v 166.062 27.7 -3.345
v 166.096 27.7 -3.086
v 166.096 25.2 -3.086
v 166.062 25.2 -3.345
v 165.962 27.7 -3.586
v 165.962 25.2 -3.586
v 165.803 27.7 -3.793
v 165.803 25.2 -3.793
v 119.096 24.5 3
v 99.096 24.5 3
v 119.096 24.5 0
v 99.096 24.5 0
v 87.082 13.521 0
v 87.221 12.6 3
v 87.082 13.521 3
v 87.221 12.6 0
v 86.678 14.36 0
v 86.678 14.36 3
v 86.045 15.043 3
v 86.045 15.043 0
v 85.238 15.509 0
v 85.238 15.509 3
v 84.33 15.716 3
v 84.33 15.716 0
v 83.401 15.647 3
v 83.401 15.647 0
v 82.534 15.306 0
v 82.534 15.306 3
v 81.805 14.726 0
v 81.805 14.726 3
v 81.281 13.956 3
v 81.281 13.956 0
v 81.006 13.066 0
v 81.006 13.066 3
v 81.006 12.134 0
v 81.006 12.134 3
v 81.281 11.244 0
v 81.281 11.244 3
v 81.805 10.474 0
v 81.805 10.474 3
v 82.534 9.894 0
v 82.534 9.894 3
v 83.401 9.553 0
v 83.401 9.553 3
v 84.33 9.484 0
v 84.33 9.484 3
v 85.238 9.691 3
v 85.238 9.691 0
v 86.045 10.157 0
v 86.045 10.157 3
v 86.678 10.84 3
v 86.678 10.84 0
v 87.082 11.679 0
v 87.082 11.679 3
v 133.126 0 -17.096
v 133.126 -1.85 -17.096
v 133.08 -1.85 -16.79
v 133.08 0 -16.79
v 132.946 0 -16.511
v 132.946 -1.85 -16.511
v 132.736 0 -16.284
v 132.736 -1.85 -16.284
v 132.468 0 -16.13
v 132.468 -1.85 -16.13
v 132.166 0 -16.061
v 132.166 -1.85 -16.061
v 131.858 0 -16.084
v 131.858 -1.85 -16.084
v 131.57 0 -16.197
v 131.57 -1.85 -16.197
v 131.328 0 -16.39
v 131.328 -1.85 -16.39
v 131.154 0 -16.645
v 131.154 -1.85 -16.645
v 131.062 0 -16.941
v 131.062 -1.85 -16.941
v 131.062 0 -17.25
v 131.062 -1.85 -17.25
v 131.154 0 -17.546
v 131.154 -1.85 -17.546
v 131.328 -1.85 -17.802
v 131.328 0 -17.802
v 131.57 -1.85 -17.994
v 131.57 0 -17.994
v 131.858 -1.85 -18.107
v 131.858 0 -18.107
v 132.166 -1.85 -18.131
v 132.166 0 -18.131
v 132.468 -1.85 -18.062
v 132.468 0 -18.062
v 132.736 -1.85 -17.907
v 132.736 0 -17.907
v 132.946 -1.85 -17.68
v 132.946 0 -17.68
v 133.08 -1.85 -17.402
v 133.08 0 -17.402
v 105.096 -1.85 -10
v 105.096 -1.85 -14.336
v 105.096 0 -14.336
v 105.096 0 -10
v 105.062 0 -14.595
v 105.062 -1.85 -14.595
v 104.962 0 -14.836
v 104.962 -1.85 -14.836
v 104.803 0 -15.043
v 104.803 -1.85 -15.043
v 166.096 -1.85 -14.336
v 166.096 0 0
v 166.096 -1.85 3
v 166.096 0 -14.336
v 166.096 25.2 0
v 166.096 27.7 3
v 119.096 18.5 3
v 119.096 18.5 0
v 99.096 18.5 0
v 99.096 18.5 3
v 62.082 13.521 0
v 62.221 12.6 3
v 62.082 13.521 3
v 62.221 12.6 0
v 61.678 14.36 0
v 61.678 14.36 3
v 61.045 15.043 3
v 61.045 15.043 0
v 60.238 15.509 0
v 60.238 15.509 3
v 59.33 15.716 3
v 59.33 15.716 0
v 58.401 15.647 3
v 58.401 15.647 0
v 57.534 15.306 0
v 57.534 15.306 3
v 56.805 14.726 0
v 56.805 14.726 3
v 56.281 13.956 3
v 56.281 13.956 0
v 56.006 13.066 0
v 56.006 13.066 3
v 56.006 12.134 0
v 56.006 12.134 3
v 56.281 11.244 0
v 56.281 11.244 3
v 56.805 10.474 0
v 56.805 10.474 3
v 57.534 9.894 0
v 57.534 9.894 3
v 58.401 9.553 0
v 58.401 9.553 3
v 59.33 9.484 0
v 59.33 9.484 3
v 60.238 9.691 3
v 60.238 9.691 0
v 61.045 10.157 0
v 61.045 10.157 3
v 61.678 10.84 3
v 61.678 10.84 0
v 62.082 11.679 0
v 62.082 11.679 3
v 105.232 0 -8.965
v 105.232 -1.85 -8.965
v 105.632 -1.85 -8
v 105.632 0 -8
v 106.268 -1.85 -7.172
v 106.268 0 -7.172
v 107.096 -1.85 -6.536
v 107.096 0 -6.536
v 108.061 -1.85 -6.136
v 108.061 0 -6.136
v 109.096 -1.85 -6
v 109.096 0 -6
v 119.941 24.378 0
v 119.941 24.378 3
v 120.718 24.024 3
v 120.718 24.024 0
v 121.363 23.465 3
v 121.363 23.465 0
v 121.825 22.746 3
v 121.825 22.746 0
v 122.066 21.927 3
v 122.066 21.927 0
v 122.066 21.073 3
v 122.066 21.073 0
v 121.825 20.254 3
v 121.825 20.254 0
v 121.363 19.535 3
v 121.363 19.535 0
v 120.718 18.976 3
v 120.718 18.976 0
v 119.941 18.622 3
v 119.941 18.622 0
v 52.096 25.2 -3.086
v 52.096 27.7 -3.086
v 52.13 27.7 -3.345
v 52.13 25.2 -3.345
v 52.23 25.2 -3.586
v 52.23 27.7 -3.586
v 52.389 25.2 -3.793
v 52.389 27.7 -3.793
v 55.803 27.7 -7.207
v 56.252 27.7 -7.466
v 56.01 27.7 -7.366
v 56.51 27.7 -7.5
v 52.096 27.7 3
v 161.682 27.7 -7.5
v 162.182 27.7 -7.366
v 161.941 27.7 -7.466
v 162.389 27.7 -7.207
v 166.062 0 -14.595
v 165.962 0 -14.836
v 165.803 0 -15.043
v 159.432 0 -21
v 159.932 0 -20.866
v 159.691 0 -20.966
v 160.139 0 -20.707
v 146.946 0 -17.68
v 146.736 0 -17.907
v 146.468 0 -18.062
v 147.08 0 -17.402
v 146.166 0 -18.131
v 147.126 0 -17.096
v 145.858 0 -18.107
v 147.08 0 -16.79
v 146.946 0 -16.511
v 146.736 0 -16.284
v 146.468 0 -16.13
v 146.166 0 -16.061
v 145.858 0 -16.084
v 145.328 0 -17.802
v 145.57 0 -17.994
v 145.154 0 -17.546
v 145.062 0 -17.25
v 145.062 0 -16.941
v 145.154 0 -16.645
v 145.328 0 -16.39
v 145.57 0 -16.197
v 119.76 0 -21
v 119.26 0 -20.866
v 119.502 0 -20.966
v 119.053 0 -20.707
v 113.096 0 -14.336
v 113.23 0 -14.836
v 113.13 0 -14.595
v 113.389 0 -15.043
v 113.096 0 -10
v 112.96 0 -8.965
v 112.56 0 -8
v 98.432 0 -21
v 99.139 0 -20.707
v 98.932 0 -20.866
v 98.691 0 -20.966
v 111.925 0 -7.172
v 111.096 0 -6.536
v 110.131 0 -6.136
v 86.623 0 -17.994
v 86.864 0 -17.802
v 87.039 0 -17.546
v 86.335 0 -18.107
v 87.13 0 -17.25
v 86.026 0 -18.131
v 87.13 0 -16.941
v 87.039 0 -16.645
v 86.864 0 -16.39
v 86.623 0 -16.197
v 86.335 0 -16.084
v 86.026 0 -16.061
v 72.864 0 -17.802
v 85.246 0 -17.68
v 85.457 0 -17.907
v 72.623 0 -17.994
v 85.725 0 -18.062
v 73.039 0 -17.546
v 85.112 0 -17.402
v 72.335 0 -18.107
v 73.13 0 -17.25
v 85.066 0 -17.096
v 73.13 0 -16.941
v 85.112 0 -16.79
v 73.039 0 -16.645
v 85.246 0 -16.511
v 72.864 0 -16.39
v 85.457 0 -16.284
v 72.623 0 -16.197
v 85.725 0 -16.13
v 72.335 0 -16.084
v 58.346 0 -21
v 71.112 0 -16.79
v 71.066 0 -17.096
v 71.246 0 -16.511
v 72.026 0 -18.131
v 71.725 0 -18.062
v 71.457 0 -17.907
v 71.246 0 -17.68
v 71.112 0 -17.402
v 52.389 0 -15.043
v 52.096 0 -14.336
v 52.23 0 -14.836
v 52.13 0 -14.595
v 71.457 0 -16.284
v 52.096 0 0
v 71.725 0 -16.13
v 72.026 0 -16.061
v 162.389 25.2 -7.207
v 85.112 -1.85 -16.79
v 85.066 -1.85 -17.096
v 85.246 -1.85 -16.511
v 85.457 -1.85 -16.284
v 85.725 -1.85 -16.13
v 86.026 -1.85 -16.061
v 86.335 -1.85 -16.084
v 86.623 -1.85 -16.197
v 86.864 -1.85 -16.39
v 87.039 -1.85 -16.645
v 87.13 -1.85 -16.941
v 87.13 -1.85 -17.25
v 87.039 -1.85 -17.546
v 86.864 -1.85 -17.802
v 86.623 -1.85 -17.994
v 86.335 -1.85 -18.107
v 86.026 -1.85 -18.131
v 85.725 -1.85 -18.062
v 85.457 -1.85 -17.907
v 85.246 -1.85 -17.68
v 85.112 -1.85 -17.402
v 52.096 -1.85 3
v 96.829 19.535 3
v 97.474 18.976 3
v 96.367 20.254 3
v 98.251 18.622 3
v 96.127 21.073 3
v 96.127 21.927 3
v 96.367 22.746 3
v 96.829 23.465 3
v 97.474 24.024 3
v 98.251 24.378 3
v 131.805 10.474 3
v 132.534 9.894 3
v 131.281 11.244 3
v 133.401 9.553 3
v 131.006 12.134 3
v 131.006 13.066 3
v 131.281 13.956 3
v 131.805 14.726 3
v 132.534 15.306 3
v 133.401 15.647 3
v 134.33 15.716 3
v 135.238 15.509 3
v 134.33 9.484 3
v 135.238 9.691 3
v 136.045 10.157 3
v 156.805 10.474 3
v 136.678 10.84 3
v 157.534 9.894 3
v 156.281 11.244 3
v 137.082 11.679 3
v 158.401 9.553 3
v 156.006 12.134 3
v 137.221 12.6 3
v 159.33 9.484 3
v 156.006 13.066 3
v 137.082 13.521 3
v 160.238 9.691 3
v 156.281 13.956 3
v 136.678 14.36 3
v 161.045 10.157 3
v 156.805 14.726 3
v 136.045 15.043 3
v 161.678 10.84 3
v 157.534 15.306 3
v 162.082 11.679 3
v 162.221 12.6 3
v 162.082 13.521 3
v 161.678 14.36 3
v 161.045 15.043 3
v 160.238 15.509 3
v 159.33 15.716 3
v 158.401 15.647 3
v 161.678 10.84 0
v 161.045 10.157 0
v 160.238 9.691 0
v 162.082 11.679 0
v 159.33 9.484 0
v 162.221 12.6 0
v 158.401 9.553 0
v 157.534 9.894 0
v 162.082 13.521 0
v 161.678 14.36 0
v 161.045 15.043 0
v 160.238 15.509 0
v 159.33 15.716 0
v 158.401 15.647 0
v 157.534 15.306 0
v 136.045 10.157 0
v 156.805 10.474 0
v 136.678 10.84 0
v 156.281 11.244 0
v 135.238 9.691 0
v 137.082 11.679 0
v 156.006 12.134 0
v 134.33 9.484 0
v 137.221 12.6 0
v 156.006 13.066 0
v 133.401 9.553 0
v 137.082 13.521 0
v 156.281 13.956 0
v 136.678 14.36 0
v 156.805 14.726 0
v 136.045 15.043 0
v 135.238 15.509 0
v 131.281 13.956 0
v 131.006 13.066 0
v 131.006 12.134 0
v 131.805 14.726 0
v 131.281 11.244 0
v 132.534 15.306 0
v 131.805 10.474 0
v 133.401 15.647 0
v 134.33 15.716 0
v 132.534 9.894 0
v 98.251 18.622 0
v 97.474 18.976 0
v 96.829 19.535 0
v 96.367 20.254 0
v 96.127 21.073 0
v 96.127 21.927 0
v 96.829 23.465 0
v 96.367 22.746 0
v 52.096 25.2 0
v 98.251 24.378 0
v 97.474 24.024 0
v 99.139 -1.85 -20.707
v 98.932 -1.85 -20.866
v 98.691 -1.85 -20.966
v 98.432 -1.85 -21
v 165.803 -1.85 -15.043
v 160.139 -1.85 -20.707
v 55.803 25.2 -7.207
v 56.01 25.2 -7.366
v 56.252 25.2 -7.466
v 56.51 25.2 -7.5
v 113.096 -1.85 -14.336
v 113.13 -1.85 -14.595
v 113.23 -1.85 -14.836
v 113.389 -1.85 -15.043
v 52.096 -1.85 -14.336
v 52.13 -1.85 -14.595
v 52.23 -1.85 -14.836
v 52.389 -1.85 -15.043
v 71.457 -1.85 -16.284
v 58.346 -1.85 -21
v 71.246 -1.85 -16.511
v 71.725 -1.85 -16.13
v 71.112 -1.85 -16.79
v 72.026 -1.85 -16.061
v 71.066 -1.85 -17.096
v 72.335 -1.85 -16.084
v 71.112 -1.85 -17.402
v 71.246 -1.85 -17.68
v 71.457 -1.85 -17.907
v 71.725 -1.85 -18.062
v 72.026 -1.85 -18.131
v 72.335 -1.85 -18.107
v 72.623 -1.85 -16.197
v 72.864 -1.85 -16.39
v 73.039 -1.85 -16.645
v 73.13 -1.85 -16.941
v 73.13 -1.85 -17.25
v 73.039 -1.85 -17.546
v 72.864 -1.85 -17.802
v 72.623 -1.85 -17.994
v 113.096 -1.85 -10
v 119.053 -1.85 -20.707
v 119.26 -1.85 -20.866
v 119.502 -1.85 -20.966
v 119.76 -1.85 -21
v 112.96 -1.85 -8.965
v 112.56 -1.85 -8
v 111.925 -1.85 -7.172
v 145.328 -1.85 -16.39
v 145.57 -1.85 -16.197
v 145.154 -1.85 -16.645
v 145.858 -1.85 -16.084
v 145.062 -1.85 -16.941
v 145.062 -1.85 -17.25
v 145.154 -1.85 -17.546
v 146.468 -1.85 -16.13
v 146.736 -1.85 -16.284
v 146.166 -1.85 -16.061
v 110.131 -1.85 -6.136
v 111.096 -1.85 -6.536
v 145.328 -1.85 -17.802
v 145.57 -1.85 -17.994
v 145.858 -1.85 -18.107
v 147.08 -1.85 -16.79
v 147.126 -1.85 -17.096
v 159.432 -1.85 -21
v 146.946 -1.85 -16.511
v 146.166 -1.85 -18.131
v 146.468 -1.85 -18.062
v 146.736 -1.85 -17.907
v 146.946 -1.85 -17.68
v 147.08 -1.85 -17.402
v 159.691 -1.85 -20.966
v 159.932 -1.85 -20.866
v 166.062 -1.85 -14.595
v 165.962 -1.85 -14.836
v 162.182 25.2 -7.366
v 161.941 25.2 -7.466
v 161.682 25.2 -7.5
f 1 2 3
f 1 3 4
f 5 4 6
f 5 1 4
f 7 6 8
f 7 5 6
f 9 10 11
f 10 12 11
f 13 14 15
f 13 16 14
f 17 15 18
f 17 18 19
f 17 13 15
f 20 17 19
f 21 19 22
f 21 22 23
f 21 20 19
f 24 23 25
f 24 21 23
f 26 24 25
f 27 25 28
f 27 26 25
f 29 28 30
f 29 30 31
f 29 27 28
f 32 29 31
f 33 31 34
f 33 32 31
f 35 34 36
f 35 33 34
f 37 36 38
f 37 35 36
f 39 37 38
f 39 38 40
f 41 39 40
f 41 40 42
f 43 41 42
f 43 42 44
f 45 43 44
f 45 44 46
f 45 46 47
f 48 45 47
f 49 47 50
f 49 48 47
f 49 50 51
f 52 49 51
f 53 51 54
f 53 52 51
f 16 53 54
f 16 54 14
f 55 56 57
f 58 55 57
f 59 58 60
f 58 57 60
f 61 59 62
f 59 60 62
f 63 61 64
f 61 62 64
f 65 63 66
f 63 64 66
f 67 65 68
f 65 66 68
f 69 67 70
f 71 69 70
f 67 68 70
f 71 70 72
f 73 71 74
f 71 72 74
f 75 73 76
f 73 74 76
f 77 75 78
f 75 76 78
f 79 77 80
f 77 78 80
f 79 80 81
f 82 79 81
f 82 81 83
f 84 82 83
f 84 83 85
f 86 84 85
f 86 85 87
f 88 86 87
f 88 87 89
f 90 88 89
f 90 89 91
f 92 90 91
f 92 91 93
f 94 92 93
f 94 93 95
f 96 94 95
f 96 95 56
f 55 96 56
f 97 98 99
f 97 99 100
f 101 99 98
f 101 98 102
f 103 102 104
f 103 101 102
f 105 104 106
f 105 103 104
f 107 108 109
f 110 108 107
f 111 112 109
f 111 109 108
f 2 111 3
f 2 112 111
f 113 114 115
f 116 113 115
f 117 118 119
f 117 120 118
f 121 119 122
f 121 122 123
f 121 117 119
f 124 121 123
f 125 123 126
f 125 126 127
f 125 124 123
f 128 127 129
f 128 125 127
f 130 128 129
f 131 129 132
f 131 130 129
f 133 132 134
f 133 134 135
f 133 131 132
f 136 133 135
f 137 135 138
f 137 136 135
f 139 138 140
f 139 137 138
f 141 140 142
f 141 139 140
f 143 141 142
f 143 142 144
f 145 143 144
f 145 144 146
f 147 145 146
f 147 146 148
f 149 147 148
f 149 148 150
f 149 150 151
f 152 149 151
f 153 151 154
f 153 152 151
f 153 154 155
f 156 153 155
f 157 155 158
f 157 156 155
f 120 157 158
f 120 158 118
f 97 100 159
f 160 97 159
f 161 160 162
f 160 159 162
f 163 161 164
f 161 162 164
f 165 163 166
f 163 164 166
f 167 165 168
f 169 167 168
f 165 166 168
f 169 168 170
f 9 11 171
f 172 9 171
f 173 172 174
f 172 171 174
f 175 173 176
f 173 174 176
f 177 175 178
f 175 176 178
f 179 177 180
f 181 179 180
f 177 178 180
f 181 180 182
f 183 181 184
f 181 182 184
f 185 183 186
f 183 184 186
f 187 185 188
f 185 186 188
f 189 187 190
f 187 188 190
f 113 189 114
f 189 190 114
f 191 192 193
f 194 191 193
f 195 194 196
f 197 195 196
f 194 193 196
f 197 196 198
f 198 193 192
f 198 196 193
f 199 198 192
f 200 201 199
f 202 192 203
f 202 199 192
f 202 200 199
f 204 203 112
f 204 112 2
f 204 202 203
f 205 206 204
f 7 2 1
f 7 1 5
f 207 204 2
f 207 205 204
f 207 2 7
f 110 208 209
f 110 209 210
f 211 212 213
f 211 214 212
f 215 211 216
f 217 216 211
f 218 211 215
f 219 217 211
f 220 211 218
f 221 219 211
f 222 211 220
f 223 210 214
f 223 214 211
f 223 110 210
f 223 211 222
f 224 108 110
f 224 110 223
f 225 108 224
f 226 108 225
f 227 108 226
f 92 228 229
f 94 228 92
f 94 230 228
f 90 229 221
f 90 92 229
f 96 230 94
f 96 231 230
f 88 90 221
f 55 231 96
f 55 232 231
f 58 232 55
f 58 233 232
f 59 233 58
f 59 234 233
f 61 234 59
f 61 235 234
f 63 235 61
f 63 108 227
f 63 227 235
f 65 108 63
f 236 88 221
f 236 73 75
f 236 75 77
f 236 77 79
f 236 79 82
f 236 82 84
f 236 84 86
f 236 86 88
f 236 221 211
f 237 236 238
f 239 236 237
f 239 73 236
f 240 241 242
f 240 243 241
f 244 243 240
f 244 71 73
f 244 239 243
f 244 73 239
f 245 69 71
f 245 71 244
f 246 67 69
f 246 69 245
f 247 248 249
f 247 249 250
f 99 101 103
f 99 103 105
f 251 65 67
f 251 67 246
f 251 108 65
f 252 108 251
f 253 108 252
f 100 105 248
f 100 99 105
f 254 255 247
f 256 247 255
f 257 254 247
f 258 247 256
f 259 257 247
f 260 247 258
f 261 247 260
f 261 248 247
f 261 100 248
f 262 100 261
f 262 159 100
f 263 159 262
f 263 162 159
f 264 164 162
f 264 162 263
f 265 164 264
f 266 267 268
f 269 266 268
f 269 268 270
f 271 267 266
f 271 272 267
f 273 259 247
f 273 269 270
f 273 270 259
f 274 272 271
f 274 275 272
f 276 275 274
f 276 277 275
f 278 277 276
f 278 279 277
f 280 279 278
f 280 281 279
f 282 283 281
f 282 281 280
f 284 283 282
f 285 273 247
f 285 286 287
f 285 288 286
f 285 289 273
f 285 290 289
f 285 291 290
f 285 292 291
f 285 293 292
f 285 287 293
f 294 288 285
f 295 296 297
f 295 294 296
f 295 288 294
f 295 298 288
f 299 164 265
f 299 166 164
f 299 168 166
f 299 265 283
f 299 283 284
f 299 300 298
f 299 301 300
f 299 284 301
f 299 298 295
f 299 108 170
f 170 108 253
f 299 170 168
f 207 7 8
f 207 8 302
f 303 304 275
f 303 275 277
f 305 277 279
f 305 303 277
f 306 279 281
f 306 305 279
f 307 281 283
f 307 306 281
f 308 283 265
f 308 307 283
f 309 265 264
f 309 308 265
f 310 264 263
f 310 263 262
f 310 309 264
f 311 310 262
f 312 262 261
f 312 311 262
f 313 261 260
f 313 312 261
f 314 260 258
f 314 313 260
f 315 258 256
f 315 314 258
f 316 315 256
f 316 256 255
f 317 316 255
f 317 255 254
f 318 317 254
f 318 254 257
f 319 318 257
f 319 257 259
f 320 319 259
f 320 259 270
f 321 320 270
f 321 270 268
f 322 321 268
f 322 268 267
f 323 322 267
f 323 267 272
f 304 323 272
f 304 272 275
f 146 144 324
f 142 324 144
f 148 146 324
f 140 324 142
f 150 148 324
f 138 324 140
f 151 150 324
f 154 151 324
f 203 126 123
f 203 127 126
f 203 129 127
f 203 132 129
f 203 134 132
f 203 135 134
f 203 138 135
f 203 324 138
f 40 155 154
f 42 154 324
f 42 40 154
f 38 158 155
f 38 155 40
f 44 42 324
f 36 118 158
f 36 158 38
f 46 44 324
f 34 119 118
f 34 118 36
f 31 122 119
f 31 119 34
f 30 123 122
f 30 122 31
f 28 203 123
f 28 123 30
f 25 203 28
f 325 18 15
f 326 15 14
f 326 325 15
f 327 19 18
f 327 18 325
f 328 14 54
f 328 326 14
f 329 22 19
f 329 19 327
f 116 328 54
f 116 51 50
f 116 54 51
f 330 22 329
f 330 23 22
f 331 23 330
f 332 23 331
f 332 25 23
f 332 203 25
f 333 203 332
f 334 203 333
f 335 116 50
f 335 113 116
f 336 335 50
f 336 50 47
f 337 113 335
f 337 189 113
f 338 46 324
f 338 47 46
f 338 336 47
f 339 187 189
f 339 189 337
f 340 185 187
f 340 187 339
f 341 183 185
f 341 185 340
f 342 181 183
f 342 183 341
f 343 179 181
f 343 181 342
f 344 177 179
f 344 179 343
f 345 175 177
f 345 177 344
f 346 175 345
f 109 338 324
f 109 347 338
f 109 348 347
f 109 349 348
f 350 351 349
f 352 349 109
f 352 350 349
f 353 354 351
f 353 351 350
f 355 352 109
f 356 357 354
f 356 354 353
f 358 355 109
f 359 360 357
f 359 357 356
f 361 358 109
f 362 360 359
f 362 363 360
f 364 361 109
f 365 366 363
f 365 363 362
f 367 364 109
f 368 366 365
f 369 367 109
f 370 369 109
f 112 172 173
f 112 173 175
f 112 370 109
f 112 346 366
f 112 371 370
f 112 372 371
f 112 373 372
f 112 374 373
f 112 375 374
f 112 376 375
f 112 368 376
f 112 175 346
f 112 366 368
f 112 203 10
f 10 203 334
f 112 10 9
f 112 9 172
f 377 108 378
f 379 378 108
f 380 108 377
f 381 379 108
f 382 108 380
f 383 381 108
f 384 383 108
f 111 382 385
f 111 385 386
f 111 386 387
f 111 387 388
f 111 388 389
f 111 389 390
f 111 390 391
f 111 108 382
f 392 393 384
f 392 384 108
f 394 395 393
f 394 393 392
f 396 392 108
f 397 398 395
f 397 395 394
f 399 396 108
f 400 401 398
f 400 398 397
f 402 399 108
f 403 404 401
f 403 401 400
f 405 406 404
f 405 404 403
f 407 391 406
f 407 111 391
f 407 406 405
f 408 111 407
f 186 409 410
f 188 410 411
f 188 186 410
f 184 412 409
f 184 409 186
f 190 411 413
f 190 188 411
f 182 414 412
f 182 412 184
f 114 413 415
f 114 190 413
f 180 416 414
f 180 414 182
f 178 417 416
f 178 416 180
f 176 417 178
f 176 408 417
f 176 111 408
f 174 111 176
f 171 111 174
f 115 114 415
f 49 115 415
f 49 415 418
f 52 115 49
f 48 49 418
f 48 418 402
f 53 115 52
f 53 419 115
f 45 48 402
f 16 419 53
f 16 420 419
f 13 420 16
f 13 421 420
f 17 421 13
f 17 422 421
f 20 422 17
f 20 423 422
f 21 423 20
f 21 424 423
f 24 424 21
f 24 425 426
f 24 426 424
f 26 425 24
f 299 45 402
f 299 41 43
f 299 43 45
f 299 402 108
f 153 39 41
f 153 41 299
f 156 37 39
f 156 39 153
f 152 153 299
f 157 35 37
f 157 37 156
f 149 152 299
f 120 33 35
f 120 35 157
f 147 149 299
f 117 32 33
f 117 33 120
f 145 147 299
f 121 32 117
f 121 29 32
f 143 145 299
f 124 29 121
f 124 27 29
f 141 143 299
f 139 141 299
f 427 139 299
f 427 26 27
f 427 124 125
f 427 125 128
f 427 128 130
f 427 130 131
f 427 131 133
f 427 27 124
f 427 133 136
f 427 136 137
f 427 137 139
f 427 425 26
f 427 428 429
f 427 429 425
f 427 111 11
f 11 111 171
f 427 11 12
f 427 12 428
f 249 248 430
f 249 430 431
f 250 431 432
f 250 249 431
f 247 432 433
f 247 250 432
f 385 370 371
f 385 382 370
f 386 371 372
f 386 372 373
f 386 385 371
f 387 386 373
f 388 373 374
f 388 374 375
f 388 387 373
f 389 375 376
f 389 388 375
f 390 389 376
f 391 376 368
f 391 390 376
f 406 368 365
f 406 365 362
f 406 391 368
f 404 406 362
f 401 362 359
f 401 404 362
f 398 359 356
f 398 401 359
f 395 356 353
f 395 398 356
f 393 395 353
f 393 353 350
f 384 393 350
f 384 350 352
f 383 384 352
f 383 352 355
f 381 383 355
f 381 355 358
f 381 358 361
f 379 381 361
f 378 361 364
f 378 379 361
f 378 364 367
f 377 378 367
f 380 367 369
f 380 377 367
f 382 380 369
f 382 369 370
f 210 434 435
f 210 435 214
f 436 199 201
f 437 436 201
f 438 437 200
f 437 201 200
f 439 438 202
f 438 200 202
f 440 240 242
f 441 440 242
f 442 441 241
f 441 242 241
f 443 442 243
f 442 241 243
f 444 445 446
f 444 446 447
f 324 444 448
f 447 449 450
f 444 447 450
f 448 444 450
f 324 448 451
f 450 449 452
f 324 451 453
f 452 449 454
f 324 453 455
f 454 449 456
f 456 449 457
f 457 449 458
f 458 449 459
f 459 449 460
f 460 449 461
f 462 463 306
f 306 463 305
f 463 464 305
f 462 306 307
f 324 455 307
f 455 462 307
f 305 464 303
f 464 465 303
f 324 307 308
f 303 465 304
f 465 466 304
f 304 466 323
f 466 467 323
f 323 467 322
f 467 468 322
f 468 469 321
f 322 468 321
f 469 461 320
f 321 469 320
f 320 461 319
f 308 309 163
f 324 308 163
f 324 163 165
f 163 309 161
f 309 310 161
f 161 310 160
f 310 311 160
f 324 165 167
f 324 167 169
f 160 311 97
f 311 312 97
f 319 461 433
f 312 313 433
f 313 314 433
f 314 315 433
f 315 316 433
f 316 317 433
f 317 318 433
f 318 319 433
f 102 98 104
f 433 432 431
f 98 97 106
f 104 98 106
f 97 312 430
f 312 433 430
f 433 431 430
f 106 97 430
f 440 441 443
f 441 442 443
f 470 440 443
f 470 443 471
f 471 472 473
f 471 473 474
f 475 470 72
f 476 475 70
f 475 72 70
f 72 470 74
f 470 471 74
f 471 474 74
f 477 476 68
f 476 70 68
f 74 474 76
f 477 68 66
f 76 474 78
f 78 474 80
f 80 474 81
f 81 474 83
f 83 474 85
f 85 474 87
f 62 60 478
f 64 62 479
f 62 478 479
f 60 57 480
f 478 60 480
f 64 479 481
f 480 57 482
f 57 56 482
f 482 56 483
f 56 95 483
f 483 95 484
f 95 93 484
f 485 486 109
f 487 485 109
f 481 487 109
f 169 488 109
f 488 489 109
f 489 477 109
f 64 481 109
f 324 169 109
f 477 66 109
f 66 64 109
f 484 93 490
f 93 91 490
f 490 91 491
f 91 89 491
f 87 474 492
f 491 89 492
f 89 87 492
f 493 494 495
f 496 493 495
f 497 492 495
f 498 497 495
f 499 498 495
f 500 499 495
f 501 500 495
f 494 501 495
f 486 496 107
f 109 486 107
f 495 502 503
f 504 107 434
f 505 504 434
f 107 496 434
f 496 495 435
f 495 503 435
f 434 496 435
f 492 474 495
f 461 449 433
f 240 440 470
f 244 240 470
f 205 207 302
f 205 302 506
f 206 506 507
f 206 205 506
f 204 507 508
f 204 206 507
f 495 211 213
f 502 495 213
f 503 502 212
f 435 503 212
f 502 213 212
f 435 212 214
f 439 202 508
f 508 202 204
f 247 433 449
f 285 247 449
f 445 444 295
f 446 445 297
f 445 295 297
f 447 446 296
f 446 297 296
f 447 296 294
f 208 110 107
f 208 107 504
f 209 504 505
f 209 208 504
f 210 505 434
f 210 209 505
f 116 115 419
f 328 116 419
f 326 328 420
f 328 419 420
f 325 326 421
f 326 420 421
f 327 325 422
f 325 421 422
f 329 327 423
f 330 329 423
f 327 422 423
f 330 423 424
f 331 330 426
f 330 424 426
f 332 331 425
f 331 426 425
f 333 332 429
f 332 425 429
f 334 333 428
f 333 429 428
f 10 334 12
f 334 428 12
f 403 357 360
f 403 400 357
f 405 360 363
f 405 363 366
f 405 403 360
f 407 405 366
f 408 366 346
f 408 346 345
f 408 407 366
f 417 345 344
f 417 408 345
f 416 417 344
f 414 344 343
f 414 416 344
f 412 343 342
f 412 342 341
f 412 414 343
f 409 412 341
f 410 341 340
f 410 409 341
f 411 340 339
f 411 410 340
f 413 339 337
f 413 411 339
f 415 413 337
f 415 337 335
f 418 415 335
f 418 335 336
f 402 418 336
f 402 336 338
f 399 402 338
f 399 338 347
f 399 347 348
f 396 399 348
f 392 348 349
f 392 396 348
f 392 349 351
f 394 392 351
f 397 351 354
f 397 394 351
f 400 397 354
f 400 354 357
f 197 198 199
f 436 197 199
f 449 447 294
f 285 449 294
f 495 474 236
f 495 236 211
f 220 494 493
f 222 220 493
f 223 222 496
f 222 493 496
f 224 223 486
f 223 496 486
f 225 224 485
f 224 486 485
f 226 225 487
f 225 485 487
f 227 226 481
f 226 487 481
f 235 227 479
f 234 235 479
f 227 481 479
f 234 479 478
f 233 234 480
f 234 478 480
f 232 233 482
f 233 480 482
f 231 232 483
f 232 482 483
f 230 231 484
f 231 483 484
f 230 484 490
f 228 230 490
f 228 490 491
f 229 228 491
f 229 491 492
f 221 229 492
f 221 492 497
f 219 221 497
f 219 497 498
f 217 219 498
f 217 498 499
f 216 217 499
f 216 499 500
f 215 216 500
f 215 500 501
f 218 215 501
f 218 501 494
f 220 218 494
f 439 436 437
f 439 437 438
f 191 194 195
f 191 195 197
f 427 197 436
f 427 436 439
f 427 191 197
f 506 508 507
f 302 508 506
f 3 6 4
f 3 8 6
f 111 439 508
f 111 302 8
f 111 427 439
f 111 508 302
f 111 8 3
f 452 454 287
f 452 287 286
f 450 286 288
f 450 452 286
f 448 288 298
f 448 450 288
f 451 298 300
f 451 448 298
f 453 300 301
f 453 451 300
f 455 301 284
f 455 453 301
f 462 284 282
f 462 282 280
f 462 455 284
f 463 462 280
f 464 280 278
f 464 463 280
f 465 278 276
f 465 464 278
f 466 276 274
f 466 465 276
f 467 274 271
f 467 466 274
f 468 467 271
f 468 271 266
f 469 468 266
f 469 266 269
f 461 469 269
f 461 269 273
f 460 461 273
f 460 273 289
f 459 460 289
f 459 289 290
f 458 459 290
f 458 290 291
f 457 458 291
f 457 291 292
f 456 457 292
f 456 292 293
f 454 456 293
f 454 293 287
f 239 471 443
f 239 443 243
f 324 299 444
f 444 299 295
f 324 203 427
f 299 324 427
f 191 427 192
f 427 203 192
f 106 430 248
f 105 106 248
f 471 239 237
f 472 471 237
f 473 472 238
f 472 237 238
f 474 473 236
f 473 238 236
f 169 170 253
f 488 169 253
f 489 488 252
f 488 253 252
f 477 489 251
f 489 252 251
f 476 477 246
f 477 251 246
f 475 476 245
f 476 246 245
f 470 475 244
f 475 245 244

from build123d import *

# Parameters (mm, degrees)
SKETCH1_R            = 3.125
BOSS_EXTRUDE1_DEPTH  = 2.5
BOSS_EXTRUDE2_START  = -2.5
SKETCH2_W            = 114
SKETCH2_H            = 2.5
BOSS_EXTRUDE2_DEPTH  = 6
SKETCH2_6_W          = 114
SKETCH2_6_H          = 2
BOSS_EXTRUDE3_DEPTH  = 10
SKETCH5_W            = 53
SKETCH5_H            = 15
SKETCH5_R            = 1.03775
BOSS_EXTRUDE4_DEPTH  = 2.5
CHAMFER1_SIZE        = 6.25
CHAMFER2_SIZE        = 4
FILLET2_R            = 1
FILLET3_R            = 4
CUT_EXTRUDE2_DEPTH   = 171.104117862
MOVE_START           = 2.5
MOVE_FACE1_OUTLINE_W = 114
MOVE_FACE1_OUTLINE_H = 30.7
MOVE_FACE1_OUTLINE_R = 3.125
MOVE_FACE1_DEPTH     = 0.5
MOVE_FACE2_BY        = 1
MOVE_FACE3_BY        = 0.5
MOVE_FACE4_BY        = 0.65


# Read off the part's stored shape, not the designer's step: Move Face1
with BuildPart() as part:
    # Sketch1 → Boss-Extrude1 (new body)
    with BuildSketch(Plane.XY):
        Polygon((52.096119502, 0), (52.096119502, 25.2), (52.096119502, 28.2), (166.096119502, 28.2), (166.096119502, 25.2), (166.096119502, 0), (166.096119502, -2.5), (52.096119502, -2.5), align=None)
        with Locations((84.096119502, 12.6)):
            Circle(SKETCH1_R, mode=Mode.SUBTRACT)
        with Locations((134.096119502, 12.6)):
            Circle(SKETCH1_R, mode=Mode.SUBTRACT)
        with Locations((59.096119502, 12.6)):
            Circle(SKETCH1_R, mode=Mode.SUBTRACT)
        with Locations((159.096119502, 12.6)):
            Circle(SKETCH1_R, mode=Mode.SUBTRACT)
    extrude(amount=BOSS_EXTRUDE1_DEPTH)

    # Sketch2 → Boss-Extrude2 (add)
    with BuildSketch(Plane.XY.offset(2.5).offset(BOSS_EXTRUDE2_START)):
        with Locations((109.096119502, -1.25)):
            Rectangle(SKETCH2_W, SKETCH2_H)
    extrude(amount=-BOSS_EXTRUDE2_DEPTH)

    # Sketch2<6> → Boss-Extrude3 (add)
    with BuildSketch(Plane.XY.offset(2.5)):
        with Locations((109.096119502, 27.2)):
            Rectangle(SKETCH2_6_W, SKETCH2_6_H)
    extrude(amount=-BOSS_EXTRUDE3_DEPTH)

    # Sketch5 → Boss-Extrude4 (add)
    with BuildSketch(Plane.XZ.offset(2.5)):
        with Locations((139.596119502, -13.5)):
            Rectangle(SKETCH5_W, SKETCH5_H)
        with Locations((146.088533212, -17.095733919)):
            Circle(SKETCH5_R, mode=Mode.SUBTRACT)
        with Locations((132.088533212, -17.095733919)):
            Circle(SKETCH5_R, mode=Mode.SUBTRACT)
    boss_extrude4 = extrude(amount=-BOSS_EXTRUDE4_DEPTH)

    # Mirror1: Boss-Extrude4 across plane
    add(boss_extrude4.mirror(Plane(origin=(109.096119502, 0, 0), x_dir=(0, 0, 1), z_dir=(1, 0, 0))))

    # Chamfer1
    chamfer1_edges = [part.edges().sort_by_distance(p)[0] for p in [
        (166.096119502, -1.25, -21),
        (113.096119502, -1.25, -21),
        (52.096119502, -1.25, -21),
        (105.096119502, -1.25, -21),
    ]]
    chamfer(chamfer1_edges, length=CHAMFER1_SIZE)

    # Chamfer2
    chamfer2_edges = [part.edges().sort_by_distance(p)[0] for p in [
        (52.096119502, 27.2, -7.5),
        (166.096119502, 27.2, -7.5),
    ]]
    chamfer(chamfer2_edges, length=CHAMFER2_SIZE)

    # Fillet2
    fillet2_edges = [part.edges().sort_by_distance(p)[0] for p in [
        (98.846119502, -1.25, -21),
        (105.096119502, -1.25, -14.75),
        (113.096119502, -1.25, -14.75),
        (159.846119502, -1.25, -21),
        (119.346119502, -1.25, -21),
        (166.096119502, -1.25, -14.75),
        (166.096119502, 27.2, -3.5),
        (56.096119502, 27.2, -7.5),
        (162.096119502, 27.2, -7.5),
        (52.096119502, 27.2, -3.5),
        (52.096119502, -1.25, -14.75),
    ]]
    fillet(fillet2_edges, radius=FILLET2_R)

    # Fillet3
    fillet3_edges = [part.edges().sort_by_distance(p)[0] for p in [
        (113.096119502, -1.25, -6),
        (105.096119502, -1.25, -6),
    ]]
    fillet(fillet3_edges, radius=FILLET3_R - 0.0001)  # a hair under: the kernel refuses the full size

    # Sketch6 → Cut-Extrude2 (cut, through all)
    with BuildSketch(Plane.XY.offset(2.5)):
        with BuildLine():
            Line((119.096119502, 24.5), (99.096119502, 24.5))
            ThreePointArc((99.096119502, 24.5), (96.096119502, 21.5), (99.096119502, 18.5))
            Line((99.096119502, 18.5), (119.096119502, 18.5))
            ThreePointArc((119.096119502, 18.5), (122.096119502, 21.5), (119.096119502, 24.5))
        make_face()
    extrude(amount=-CUT_EXTRUDE2_DEPTH, mode=Mode.SUBTRACT)

    # Move Face1 outline → Move Face1 (add)
    with BuildSketch(Plane.XY.offset(MOVE_START)):
        with Locations((109.096119502, 12.85)):
            Rectangle(MOVE_FACE1_OUTLINE_W, MOVE_FACE1_OUTLINE_H)
        with Locations((59.096119502, 12.6)):
            Circle(MOVE_FACE1_OUTLINE_R, mode=Mode.SUBTRACT)
        with Locations((84.096119502, 12.6)):
            Circle(MOVE_FACE1_OUTLINE_R, mode=Mode.SUBTRACT)
        with Locations((134.096119502, 12.6)):
            Circle(MOVE_FACE1_OUTLINE_R, mode=Mode.SUBTRACT)
        with Locations((159.096119502, 12.6)):
            Circle(MOVE_FACE1_OUTLINE_R, mode=Mode.SUBTRACT)
        with BuildLine():
            Line((99.096119502, 24.5), (119.096119502, 24.5))
            ThreePointArc((119.096119502, 24.5), (122.096119502, 21.5), (119.096119502, 18.5))
            Line((119.096119502, 18.5), (99.096119502, 18.5))
            ThreePointArc((99.096119502, 18.5), (96.096119502, 21.5), (99.096119502, 24.5))
        make_face(mode=Mode.SUBTRACT)
    extrude(amount=MOVE_FACE1_DEPTH)

    # Move Face2: a face moved outward by 1.0
    extrude(part.faces().sort_by_distance((109.096119502, 26.2, -3.703733506))[0], amount=MOVE_FACE2_BY, dir=(0, -1, 0))

    # Move Face3: a face moved inward by 0.5
    extrude(part.faces().sort_by_distance((109.096119502, 28.2, -2.196700016))[0], amount=MOVE_FACE3_BY, dir=(0, -1, 0), mode=Mode.SUBTRACT)

    # Move Face4: a face moved inward by 0.65
    extrude(part.faces().sort_by_distance((109.096119502, -2.5, -3))[0], amount=MOVE_FACE4_BY, dir=(0, 1, 0), mode=Mode.SUBTRACT)


solid = part.part
